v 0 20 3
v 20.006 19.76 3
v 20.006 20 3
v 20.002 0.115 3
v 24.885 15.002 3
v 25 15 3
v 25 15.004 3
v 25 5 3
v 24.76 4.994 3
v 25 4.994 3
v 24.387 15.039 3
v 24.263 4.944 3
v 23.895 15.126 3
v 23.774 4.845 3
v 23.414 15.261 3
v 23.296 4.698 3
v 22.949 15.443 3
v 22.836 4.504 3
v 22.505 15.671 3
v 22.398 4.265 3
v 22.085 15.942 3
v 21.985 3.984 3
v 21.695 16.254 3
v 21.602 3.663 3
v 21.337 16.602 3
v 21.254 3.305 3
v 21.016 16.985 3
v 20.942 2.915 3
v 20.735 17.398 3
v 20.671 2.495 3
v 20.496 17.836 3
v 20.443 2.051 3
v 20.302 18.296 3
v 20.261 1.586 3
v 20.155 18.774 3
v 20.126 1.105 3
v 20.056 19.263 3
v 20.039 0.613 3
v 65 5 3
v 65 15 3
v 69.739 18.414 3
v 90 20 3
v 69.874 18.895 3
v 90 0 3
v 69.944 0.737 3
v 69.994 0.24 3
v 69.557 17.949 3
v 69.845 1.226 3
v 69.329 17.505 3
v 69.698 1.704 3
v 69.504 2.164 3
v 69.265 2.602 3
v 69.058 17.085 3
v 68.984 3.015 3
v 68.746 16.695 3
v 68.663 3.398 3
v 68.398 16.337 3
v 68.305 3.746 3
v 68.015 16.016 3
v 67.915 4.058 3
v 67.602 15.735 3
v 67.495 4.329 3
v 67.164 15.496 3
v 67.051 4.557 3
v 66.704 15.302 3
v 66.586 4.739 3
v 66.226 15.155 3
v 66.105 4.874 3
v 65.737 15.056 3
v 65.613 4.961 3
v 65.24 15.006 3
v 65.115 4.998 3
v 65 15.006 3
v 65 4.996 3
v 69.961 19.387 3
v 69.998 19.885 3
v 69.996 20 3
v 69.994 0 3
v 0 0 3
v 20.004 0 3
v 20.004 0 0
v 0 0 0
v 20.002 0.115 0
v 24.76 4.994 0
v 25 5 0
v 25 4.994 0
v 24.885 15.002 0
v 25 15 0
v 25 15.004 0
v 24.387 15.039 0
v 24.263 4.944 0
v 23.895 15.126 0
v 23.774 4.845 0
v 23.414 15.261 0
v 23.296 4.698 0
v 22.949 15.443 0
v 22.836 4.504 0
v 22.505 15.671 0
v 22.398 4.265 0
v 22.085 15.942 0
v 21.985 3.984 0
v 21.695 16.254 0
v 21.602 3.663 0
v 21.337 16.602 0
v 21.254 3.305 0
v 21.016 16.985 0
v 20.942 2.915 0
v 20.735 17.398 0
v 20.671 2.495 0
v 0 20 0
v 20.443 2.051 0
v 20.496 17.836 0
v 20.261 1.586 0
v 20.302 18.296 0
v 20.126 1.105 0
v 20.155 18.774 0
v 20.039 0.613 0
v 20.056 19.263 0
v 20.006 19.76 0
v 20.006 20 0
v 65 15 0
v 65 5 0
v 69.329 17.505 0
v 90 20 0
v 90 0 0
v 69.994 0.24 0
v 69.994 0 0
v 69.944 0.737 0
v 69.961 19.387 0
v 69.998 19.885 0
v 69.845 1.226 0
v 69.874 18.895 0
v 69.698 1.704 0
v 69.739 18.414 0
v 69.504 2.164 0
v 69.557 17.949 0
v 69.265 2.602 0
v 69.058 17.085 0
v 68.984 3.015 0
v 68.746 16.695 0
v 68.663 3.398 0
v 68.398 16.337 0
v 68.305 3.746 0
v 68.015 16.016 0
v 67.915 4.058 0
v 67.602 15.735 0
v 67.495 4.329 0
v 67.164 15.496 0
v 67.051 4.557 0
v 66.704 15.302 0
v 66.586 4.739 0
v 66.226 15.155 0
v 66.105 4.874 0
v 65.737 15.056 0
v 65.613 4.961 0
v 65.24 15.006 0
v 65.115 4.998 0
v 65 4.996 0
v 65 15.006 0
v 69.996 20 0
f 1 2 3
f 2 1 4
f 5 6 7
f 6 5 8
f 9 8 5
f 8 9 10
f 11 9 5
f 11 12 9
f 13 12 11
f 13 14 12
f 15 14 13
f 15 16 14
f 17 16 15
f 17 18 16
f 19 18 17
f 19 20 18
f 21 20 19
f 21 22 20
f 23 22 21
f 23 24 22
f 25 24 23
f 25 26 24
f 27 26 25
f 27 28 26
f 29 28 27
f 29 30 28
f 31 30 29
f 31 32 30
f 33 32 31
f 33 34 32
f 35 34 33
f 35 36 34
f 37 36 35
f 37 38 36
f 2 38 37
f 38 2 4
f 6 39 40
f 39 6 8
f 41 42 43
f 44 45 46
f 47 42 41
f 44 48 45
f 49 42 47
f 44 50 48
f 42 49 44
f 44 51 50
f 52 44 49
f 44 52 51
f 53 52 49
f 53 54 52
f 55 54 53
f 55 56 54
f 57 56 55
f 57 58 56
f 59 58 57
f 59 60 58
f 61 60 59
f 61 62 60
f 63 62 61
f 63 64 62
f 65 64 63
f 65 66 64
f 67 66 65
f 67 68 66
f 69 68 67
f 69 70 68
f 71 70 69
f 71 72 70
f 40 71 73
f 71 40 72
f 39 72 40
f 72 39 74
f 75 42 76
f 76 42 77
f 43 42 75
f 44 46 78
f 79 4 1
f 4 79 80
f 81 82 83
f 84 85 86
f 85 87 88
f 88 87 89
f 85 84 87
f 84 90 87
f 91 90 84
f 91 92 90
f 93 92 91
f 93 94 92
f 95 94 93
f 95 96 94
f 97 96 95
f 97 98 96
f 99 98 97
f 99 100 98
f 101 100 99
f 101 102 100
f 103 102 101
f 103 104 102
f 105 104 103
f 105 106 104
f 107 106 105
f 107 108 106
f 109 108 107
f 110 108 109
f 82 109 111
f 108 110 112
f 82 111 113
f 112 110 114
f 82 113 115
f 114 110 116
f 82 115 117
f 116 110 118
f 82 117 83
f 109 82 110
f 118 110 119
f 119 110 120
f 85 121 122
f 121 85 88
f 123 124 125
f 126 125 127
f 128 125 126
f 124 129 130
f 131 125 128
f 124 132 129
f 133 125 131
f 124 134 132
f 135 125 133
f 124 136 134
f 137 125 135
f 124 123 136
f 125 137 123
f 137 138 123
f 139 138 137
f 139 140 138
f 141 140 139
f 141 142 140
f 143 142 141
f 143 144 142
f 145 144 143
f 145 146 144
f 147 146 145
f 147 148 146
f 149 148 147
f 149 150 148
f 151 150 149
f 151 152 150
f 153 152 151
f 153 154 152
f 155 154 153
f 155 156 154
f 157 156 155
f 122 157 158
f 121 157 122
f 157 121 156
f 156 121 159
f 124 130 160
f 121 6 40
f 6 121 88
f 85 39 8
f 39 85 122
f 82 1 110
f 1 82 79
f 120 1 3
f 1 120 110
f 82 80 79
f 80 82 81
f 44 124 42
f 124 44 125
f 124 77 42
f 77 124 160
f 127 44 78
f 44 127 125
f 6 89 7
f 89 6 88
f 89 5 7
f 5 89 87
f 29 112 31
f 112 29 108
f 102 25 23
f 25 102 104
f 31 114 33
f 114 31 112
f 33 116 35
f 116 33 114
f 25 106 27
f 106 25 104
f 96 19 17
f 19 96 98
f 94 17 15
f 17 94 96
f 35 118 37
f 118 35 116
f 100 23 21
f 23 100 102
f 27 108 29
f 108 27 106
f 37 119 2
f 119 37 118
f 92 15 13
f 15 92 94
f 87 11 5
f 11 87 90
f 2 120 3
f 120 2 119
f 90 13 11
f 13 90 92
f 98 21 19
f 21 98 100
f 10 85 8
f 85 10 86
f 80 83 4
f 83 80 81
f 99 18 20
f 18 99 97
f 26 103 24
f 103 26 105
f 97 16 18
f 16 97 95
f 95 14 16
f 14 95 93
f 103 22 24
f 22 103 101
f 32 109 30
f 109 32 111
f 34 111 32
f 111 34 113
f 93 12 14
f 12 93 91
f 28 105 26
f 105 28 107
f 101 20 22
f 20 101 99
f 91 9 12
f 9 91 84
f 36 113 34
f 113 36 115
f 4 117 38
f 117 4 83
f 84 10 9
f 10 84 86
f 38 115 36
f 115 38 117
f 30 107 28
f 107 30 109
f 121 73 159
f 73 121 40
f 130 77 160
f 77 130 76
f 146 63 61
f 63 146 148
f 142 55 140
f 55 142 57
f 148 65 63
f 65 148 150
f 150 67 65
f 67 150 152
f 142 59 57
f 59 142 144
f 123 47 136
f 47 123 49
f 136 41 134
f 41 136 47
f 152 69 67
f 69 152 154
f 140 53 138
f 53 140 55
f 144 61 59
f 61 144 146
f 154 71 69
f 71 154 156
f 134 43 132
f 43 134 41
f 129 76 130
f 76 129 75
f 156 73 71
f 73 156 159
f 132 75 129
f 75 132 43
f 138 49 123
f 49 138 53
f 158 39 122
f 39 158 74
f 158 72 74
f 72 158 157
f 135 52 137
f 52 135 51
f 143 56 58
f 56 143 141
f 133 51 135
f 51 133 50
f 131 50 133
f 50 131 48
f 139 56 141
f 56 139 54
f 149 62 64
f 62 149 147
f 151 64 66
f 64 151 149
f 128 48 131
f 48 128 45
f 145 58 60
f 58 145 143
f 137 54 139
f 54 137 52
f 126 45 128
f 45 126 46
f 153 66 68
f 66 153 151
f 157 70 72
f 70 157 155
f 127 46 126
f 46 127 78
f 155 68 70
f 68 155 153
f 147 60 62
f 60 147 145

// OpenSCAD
epaisseur=3;
longueur_centre=50;
largeur_centre=10;
longueur_attache=20;
largeur_attache=20;
rayon=5;
profondeur_entaille=0;


eprouvette(epaisseur,longueur_centre,largeur_centre,longueur_attache,largeur_attache,rayon,profondeur_entaille);
$fa=0.5;
$fs=0.5;


module eprouvette(e=3, loc=50, lac=10, loa=20, laa=20, r=(largeur_attache-largeur_centre)/2, a=profondeur_entaille)
{
	difference()
	{
		translate([loa,laa/4,0])
		{
			union()
			{
				cube([loc, lac, e]);
				translate([-loa, -(laa-lac)/2,0])cube([loa, laa, e]);
				translate([loc, -(laa-lac)/2,0])cube([loa, laa, e]);
			}
			union()
			{
				translate([0,lac,0])difference(){conge(e,r); translate([0,(laa-lac)/2,0])cube([r-(laa-lac)/2,r-(laa-lac)/2,e]);}
				rotate([0,0,-90])difference(){conge(e,r); translate([(laa-lac)/2,0,0])cube([r-(laa-lac)/2,r-(laa-lac)/2,e]);}
				translate([loc,lac,0])rotate([0,0,90])difference(){conge(e,r); translate([(laa-lac)/2,0,0])cube([r-(laa-lac)/2,r-(laa-lac)/2,e]);}
				translate([loc,0,0])rotate([0,0,180])difference(){conge(e,r); translate([0,(laa-lac)/2,0])cube([r-(laa-lac)/2,r-(laa-lac)/2,e]);}
			}
		}

		translate([loa+loc/2+1,(laa-lac)/2-0.01,0])cube([2,a,e]);
		//translate([loa+loc/2+1,laa-((laa-lac)/2-0.01)-a,0])cube([2,a,e]);
	}
}

module conge(e=epaisseur,r=(largeur_attache-largeur_centre)/2)
{
	difference()
	{
		cube([r,r,e]);
		translate([r+0.01,r+0.01,0-0.01])cylinder(e+0.02,r+0.01,r+0.01);
	}
}
